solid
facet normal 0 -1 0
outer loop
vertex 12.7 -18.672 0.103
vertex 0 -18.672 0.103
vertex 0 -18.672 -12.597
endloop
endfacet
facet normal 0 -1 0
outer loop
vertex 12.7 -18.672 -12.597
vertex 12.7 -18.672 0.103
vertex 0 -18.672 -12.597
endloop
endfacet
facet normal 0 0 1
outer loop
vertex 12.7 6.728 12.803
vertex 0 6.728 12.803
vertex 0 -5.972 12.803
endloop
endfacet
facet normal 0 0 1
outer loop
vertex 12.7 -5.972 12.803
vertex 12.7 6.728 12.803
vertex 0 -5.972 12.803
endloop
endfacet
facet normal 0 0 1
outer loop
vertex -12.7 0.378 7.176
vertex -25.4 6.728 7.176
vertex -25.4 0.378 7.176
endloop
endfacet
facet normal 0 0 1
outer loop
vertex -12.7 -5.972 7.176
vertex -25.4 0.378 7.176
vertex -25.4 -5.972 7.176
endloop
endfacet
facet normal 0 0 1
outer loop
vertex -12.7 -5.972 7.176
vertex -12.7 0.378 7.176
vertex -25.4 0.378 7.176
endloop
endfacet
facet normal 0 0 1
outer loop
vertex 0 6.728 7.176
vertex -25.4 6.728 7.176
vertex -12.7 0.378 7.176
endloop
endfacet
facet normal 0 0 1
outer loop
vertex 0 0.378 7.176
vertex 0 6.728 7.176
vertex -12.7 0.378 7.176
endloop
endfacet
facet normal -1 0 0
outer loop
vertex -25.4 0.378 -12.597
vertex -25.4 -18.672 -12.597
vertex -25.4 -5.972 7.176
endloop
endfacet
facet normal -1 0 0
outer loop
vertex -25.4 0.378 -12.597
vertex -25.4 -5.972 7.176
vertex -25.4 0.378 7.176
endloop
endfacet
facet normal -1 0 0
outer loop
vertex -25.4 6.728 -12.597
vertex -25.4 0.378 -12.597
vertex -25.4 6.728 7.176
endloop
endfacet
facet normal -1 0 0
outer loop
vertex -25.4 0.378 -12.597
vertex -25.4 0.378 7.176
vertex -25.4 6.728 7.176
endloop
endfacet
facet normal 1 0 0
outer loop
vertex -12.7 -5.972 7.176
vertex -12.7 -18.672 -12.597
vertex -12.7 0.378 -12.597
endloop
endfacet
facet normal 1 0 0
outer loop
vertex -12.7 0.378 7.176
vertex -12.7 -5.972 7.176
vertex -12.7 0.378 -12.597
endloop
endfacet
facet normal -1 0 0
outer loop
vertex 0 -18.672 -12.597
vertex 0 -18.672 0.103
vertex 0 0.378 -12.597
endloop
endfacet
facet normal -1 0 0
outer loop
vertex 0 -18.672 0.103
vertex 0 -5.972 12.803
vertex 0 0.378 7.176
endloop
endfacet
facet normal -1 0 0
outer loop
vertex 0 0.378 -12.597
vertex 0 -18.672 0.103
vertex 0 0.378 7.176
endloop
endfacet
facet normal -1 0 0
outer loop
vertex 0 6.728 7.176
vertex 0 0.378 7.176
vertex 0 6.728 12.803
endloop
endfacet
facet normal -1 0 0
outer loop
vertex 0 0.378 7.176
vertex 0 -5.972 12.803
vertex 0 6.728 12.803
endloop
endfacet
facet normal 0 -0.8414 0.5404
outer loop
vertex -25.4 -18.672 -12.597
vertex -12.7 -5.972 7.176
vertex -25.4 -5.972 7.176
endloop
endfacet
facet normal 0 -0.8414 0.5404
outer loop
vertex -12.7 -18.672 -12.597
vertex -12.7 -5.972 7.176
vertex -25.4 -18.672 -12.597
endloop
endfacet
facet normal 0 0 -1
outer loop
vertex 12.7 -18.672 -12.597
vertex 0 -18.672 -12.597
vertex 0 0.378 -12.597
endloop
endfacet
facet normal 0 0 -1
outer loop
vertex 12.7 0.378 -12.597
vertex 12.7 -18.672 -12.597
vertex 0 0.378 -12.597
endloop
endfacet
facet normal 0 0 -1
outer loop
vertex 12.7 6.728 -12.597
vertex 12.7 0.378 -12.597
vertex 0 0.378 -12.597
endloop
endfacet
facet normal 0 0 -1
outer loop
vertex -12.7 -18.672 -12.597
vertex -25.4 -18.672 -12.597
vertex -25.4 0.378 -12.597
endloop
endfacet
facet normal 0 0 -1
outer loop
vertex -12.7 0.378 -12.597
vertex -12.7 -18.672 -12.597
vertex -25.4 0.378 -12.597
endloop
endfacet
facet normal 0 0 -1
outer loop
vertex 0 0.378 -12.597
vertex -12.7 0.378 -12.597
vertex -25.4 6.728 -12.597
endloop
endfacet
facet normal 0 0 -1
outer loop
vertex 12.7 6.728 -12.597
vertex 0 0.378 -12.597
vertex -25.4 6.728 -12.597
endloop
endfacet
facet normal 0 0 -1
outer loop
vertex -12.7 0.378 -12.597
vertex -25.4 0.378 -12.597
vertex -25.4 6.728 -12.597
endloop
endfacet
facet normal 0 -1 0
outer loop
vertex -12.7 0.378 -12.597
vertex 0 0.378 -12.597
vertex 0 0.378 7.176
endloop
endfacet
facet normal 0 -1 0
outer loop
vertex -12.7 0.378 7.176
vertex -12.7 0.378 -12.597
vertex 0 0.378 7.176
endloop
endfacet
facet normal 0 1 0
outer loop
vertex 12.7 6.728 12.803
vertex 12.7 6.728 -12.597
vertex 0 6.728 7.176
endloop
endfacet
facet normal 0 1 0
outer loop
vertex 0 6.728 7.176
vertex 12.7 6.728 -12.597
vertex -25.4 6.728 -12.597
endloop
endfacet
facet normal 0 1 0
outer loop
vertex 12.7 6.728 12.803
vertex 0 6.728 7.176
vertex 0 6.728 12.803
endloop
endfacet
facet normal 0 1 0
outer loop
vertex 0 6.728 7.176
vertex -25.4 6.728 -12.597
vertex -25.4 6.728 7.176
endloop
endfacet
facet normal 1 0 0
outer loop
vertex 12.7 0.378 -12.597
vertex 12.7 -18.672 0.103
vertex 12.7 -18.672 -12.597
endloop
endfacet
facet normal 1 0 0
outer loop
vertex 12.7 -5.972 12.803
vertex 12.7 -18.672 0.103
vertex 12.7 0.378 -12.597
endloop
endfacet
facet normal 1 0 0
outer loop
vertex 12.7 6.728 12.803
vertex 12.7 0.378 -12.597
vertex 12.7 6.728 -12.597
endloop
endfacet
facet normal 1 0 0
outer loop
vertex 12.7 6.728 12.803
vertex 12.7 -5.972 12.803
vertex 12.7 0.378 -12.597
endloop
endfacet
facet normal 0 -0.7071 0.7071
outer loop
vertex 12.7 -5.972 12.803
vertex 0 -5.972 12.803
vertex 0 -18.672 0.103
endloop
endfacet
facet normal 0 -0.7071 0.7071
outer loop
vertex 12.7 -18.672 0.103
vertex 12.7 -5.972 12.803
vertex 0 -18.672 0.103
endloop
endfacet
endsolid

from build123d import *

# Parameters (mm, degrees)
F0_W     = 6.35
F0_H     = 19.7729410879
F1_DEPTH = 25.4
F2_START = -12.7
F2_DEPTH = 12.7
F3_DEPTH = 12.7


with BuildPart() as f1:
    # F0 (on Right) → F1 (new body)
    with BuildSketch(Plane.YZ):
        with Locations((3.5528081138, -2.7100717787)):
            Rectangle(F0_W, F0_H)
    extrude(amount=-F1_DEPTH)

    # F0 (on Right) → F2 (join)
    with BuildSketch(Plane.YZ.offset(F2_START)):
        Polygon((-5.9721918862, 7.1763987653), (-18.6721918862, -12.5965423226), (0.3778081138, -12.5965423226), (0.3778081138, 7.1763987653), align=None)
    extrude(amount=-F2_DEPTH)

    # F0 (on Right) → F3 (join)
    with BuildSketch(Plane.YZ):
        Polygon((-18.6721918862, 0.1034576774), (-18.6721918862, -12.5965423226), (-5.9721918862, 7.1763987653), (0.3778081138, 7.1763987653), (6.7278081138, 7.1763987653), (6.7278081138, 12.8034576774), (-5.9721918862, 12.8034576774), align=None)
        with Locations((3.5528081138, -2.7100717787)):
            Rectangle(F0_W, F0_H)
        Polygon((-5.9721918862, 7.1763987653), (-18.6721918862, -12.5965423226), (0.3778081138, -12.5965423226), (0.3778081138, 7.1763987653), align=None)
    extrude(amount=F3_DEPTH)


solid = f1.part
